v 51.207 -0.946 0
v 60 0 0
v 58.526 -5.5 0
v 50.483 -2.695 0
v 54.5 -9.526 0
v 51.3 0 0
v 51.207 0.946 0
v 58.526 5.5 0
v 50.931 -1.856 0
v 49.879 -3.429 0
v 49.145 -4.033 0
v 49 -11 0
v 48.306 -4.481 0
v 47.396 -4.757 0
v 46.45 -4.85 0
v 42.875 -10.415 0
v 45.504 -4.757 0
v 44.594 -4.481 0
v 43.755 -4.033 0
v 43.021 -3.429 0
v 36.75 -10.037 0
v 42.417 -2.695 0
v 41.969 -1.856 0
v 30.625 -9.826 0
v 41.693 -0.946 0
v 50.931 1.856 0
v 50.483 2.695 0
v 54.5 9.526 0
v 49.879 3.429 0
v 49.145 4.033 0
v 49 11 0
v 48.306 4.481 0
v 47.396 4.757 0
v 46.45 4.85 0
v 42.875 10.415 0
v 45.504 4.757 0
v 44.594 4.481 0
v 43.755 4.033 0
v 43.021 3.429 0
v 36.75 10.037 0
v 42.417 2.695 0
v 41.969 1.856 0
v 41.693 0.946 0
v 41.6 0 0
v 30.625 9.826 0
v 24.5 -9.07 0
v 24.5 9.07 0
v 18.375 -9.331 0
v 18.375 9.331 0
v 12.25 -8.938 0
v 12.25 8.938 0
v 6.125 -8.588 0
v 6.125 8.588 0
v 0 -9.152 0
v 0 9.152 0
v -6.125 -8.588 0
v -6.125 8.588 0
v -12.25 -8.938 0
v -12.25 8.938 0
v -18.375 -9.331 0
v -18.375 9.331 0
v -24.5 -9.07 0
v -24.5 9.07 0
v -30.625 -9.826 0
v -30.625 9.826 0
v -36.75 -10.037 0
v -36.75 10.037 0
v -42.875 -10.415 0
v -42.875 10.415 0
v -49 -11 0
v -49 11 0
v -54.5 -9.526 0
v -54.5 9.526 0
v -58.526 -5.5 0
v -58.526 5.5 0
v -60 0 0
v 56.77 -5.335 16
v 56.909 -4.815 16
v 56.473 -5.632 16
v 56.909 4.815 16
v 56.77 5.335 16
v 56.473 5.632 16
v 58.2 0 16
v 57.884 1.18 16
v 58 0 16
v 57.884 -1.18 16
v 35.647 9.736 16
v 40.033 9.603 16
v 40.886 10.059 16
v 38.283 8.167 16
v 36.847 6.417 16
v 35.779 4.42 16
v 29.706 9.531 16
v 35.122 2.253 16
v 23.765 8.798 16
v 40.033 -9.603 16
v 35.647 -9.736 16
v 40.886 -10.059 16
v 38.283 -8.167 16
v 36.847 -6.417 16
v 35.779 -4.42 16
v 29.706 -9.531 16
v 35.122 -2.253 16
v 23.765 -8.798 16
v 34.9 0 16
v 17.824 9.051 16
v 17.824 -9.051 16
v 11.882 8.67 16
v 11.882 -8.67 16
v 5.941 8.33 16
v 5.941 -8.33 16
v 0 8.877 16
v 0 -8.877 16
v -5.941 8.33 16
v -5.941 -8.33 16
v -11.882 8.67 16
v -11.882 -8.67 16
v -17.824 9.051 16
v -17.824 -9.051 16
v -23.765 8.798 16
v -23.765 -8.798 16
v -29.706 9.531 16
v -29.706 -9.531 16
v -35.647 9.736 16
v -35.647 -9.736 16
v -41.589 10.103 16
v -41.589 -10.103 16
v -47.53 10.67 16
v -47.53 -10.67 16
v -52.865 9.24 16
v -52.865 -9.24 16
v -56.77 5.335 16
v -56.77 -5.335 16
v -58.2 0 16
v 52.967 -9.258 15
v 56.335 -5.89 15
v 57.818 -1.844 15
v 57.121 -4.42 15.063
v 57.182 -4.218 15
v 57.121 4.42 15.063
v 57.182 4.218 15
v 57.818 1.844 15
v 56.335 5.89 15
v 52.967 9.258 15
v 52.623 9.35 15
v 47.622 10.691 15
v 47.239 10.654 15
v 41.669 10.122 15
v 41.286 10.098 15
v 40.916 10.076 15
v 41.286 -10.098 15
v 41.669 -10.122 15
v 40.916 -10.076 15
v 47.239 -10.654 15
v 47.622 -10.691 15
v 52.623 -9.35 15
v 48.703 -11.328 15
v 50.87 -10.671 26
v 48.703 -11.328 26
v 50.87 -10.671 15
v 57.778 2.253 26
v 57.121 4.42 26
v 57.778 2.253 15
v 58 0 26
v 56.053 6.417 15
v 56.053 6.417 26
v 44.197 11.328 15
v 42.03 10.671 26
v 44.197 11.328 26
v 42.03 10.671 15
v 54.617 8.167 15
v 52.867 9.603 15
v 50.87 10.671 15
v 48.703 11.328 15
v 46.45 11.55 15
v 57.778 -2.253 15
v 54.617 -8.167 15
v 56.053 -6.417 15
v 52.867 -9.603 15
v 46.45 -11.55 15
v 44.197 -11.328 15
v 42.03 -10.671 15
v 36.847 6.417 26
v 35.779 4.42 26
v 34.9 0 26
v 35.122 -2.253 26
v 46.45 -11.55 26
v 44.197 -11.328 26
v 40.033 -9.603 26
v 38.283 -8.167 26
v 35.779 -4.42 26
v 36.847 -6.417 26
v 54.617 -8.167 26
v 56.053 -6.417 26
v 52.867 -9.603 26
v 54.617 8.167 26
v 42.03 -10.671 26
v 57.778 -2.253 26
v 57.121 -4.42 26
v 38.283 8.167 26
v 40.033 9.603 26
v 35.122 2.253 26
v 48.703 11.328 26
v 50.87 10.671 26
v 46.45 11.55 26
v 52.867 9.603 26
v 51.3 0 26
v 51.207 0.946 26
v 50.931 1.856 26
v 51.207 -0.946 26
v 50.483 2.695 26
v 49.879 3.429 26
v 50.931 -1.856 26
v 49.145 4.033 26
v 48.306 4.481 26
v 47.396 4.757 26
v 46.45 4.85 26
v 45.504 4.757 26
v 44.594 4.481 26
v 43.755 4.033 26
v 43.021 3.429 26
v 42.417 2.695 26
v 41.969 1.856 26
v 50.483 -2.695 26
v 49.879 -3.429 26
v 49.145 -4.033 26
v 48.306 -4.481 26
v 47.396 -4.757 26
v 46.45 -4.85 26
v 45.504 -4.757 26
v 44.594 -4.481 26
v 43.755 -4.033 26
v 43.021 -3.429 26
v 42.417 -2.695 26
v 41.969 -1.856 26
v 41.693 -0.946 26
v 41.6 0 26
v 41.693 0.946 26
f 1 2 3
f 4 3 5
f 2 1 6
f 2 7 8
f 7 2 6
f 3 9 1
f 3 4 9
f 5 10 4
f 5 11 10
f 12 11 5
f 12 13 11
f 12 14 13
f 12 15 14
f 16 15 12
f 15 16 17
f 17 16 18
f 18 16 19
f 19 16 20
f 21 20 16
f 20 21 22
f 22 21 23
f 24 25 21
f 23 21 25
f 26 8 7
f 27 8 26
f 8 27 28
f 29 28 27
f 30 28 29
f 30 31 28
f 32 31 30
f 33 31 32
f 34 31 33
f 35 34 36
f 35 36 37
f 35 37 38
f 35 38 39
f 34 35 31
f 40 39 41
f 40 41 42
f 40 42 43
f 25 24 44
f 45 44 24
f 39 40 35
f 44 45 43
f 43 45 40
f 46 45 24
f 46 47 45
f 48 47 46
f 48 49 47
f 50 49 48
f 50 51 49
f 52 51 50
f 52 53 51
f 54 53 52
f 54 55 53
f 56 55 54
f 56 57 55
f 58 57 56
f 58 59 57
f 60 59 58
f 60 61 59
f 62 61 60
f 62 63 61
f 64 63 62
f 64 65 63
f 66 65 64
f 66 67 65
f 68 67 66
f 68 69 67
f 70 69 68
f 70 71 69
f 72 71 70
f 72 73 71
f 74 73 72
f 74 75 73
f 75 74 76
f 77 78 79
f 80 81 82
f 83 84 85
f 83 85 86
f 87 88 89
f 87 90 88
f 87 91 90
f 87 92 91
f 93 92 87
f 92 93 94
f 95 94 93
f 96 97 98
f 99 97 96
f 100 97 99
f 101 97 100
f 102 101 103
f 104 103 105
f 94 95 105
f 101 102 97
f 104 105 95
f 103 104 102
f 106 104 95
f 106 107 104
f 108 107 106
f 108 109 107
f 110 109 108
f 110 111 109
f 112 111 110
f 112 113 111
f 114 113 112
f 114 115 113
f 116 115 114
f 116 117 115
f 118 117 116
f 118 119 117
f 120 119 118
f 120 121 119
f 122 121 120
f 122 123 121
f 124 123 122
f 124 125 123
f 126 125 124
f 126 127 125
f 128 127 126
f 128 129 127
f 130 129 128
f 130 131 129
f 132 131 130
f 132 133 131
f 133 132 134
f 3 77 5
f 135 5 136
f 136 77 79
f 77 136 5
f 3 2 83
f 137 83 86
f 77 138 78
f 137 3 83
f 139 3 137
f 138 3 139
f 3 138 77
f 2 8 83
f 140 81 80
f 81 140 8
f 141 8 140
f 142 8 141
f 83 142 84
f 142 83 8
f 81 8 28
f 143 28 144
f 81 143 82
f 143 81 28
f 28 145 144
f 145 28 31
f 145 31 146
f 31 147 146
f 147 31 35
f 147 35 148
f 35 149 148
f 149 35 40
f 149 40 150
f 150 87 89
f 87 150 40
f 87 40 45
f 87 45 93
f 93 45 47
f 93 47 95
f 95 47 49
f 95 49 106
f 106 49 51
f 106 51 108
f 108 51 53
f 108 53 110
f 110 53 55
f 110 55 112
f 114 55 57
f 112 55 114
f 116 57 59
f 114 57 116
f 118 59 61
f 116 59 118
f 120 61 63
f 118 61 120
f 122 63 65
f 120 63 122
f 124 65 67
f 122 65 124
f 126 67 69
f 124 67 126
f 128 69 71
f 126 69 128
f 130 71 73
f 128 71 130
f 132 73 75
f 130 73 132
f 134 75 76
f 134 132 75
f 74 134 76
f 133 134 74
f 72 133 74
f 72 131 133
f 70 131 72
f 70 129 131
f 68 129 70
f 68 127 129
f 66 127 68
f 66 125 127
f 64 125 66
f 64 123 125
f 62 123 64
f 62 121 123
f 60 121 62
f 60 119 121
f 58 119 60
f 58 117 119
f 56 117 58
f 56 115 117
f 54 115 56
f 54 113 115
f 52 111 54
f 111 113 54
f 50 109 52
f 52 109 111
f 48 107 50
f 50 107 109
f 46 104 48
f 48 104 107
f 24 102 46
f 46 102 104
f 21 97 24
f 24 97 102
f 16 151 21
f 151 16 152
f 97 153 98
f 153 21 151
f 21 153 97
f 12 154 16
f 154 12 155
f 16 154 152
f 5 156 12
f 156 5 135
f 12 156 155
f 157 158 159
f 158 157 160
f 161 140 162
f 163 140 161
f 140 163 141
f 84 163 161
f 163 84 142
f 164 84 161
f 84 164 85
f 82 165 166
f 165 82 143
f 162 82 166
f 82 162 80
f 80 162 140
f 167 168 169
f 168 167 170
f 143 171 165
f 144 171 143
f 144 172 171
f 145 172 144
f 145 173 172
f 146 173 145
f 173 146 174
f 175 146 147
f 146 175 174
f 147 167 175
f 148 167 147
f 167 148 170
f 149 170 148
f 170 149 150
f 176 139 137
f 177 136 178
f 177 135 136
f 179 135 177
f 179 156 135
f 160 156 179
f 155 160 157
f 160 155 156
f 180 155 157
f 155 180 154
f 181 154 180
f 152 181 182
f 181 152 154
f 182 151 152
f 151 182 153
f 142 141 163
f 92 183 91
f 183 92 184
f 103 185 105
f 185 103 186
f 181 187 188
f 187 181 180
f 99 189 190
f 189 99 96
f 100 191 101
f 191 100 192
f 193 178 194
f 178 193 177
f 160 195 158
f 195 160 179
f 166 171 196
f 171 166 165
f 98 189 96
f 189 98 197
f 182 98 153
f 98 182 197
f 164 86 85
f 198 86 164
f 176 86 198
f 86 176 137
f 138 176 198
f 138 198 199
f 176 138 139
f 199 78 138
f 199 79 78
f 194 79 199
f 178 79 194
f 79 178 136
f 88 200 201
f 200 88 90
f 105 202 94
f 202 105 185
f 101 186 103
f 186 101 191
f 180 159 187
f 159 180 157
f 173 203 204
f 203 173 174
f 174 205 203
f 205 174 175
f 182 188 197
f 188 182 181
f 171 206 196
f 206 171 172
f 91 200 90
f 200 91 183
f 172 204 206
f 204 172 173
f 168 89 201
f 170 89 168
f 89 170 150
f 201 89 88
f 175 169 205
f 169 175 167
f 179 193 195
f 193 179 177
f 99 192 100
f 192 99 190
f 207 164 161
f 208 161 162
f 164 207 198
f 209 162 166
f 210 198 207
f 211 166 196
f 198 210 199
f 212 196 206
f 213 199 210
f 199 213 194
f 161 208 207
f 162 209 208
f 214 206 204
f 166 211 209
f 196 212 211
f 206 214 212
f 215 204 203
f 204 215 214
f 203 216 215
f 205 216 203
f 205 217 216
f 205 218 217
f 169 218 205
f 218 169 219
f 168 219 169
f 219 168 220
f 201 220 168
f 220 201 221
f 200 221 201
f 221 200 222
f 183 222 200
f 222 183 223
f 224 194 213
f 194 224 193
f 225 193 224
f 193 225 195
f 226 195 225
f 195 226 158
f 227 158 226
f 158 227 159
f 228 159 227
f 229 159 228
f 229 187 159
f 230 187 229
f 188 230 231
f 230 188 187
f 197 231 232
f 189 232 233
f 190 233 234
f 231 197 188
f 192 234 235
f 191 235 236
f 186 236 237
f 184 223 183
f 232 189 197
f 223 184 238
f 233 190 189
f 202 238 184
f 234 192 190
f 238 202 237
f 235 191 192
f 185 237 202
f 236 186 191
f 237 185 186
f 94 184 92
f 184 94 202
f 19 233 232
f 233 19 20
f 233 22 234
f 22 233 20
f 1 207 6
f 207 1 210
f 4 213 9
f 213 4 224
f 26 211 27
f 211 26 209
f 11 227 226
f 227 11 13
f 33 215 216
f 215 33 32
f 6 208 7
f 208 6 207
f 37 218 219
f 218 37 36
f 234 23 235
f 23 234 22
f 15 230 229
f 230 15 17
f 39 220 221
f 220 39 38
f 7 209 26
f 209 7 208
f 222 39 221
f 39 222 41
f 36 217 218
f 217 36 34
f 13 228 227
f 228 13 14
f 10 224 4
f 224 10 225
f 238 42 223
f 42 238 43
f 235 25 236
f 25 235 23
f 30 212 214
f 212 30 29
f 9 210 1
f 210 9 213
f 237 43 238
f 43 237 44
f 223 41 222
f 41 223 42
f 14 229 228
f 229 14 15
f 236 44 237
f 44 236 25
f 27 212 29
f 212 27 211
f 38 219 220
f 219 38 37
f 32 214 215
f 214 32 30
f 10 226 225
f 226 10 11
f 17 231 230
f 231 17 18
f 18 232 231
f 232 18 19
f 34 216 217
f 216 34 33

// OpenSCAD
$fn = 32;

// ----------------------------------------------------------------------
// Handle: 120 x 22 mm grip, 16 mm thick
// ----------------------------------------------------------------------

// --- parameters (mm) ---
length = 120;             // grip length
width = 22;               // grip width
thickness = 16;           // grip thickness
waist = 0.8;              // width factor at the middle
draft = 0.97;             // top face scale of the extrusion
scallops = 6;             // finger rests per side
ripple = 0.04;            // depth factor of the finger rests
boss_d = 23.1;            // mounting boss diameter
boss_h = 10;              // mounting boss height
boss_hole_d = 9.7;        // screw clearance through the boss
boss_r = 46.45;           // boss centre from the grip centre

/* ergonomic grip outline, closed spline-like polygon in the XY plane */
grip = [[-49, 11], [-42.875, 10.415], [-36.75, 10.037], [-30.625, 9.826], [-24.5, 9.07], [-18.375, 9.331], [-12.25, 8.938], [-6.125, 8.588], [0, 9.152], [6.125, 8.588], [12.25, 8.938], [18.375, 9.331], [24.5, 9.07], [30.625, 9.826], [36.75, 10.037], [42.875, 10.415], [49, 11], [54.5, 9.526], [58.526, 5.5], [60, 0], [58.526, -5.5], [54.5, -9.526], [49, -11], [49, -11], [42.875, -10.415], [36.75, -10.037], [30.625, -9.826], [24.5, -9.07], [18.375, -9.331], [12.25, -8.938], [6.125, -8.588], [0, -9.152], [-6.125, -8.588], [-12.25, -8.938], [-18.375, -9.331], [-24.5, -9.07], [-30.625, -9.826], [-36.75, -10.037], [-42.875, -10.415], [-49, -11], [-54.5, -9.526], [-58.526, -5.5], [-60, 0], [-58.526, 5.5], [-54.5, 9.526], [-49, 11]];

module grip_body() {
  linear_extrude(height = thickness, scale = draft) polygon(grip);
}

module boss_body() {
  /* sunk 1 mm into the grip so the joint overlaps */
  translate([boss_r, 0, thickness - 1]) cylinder(h = boss_h + 1, d = boss_d);
}

difference() {
  union() {
    grip_body();
    boss_body();
  }
  translate([boss_r, 0, -1]) cylinder(h = thickness + boss_h + 2, d = boss_hole_d);
}
